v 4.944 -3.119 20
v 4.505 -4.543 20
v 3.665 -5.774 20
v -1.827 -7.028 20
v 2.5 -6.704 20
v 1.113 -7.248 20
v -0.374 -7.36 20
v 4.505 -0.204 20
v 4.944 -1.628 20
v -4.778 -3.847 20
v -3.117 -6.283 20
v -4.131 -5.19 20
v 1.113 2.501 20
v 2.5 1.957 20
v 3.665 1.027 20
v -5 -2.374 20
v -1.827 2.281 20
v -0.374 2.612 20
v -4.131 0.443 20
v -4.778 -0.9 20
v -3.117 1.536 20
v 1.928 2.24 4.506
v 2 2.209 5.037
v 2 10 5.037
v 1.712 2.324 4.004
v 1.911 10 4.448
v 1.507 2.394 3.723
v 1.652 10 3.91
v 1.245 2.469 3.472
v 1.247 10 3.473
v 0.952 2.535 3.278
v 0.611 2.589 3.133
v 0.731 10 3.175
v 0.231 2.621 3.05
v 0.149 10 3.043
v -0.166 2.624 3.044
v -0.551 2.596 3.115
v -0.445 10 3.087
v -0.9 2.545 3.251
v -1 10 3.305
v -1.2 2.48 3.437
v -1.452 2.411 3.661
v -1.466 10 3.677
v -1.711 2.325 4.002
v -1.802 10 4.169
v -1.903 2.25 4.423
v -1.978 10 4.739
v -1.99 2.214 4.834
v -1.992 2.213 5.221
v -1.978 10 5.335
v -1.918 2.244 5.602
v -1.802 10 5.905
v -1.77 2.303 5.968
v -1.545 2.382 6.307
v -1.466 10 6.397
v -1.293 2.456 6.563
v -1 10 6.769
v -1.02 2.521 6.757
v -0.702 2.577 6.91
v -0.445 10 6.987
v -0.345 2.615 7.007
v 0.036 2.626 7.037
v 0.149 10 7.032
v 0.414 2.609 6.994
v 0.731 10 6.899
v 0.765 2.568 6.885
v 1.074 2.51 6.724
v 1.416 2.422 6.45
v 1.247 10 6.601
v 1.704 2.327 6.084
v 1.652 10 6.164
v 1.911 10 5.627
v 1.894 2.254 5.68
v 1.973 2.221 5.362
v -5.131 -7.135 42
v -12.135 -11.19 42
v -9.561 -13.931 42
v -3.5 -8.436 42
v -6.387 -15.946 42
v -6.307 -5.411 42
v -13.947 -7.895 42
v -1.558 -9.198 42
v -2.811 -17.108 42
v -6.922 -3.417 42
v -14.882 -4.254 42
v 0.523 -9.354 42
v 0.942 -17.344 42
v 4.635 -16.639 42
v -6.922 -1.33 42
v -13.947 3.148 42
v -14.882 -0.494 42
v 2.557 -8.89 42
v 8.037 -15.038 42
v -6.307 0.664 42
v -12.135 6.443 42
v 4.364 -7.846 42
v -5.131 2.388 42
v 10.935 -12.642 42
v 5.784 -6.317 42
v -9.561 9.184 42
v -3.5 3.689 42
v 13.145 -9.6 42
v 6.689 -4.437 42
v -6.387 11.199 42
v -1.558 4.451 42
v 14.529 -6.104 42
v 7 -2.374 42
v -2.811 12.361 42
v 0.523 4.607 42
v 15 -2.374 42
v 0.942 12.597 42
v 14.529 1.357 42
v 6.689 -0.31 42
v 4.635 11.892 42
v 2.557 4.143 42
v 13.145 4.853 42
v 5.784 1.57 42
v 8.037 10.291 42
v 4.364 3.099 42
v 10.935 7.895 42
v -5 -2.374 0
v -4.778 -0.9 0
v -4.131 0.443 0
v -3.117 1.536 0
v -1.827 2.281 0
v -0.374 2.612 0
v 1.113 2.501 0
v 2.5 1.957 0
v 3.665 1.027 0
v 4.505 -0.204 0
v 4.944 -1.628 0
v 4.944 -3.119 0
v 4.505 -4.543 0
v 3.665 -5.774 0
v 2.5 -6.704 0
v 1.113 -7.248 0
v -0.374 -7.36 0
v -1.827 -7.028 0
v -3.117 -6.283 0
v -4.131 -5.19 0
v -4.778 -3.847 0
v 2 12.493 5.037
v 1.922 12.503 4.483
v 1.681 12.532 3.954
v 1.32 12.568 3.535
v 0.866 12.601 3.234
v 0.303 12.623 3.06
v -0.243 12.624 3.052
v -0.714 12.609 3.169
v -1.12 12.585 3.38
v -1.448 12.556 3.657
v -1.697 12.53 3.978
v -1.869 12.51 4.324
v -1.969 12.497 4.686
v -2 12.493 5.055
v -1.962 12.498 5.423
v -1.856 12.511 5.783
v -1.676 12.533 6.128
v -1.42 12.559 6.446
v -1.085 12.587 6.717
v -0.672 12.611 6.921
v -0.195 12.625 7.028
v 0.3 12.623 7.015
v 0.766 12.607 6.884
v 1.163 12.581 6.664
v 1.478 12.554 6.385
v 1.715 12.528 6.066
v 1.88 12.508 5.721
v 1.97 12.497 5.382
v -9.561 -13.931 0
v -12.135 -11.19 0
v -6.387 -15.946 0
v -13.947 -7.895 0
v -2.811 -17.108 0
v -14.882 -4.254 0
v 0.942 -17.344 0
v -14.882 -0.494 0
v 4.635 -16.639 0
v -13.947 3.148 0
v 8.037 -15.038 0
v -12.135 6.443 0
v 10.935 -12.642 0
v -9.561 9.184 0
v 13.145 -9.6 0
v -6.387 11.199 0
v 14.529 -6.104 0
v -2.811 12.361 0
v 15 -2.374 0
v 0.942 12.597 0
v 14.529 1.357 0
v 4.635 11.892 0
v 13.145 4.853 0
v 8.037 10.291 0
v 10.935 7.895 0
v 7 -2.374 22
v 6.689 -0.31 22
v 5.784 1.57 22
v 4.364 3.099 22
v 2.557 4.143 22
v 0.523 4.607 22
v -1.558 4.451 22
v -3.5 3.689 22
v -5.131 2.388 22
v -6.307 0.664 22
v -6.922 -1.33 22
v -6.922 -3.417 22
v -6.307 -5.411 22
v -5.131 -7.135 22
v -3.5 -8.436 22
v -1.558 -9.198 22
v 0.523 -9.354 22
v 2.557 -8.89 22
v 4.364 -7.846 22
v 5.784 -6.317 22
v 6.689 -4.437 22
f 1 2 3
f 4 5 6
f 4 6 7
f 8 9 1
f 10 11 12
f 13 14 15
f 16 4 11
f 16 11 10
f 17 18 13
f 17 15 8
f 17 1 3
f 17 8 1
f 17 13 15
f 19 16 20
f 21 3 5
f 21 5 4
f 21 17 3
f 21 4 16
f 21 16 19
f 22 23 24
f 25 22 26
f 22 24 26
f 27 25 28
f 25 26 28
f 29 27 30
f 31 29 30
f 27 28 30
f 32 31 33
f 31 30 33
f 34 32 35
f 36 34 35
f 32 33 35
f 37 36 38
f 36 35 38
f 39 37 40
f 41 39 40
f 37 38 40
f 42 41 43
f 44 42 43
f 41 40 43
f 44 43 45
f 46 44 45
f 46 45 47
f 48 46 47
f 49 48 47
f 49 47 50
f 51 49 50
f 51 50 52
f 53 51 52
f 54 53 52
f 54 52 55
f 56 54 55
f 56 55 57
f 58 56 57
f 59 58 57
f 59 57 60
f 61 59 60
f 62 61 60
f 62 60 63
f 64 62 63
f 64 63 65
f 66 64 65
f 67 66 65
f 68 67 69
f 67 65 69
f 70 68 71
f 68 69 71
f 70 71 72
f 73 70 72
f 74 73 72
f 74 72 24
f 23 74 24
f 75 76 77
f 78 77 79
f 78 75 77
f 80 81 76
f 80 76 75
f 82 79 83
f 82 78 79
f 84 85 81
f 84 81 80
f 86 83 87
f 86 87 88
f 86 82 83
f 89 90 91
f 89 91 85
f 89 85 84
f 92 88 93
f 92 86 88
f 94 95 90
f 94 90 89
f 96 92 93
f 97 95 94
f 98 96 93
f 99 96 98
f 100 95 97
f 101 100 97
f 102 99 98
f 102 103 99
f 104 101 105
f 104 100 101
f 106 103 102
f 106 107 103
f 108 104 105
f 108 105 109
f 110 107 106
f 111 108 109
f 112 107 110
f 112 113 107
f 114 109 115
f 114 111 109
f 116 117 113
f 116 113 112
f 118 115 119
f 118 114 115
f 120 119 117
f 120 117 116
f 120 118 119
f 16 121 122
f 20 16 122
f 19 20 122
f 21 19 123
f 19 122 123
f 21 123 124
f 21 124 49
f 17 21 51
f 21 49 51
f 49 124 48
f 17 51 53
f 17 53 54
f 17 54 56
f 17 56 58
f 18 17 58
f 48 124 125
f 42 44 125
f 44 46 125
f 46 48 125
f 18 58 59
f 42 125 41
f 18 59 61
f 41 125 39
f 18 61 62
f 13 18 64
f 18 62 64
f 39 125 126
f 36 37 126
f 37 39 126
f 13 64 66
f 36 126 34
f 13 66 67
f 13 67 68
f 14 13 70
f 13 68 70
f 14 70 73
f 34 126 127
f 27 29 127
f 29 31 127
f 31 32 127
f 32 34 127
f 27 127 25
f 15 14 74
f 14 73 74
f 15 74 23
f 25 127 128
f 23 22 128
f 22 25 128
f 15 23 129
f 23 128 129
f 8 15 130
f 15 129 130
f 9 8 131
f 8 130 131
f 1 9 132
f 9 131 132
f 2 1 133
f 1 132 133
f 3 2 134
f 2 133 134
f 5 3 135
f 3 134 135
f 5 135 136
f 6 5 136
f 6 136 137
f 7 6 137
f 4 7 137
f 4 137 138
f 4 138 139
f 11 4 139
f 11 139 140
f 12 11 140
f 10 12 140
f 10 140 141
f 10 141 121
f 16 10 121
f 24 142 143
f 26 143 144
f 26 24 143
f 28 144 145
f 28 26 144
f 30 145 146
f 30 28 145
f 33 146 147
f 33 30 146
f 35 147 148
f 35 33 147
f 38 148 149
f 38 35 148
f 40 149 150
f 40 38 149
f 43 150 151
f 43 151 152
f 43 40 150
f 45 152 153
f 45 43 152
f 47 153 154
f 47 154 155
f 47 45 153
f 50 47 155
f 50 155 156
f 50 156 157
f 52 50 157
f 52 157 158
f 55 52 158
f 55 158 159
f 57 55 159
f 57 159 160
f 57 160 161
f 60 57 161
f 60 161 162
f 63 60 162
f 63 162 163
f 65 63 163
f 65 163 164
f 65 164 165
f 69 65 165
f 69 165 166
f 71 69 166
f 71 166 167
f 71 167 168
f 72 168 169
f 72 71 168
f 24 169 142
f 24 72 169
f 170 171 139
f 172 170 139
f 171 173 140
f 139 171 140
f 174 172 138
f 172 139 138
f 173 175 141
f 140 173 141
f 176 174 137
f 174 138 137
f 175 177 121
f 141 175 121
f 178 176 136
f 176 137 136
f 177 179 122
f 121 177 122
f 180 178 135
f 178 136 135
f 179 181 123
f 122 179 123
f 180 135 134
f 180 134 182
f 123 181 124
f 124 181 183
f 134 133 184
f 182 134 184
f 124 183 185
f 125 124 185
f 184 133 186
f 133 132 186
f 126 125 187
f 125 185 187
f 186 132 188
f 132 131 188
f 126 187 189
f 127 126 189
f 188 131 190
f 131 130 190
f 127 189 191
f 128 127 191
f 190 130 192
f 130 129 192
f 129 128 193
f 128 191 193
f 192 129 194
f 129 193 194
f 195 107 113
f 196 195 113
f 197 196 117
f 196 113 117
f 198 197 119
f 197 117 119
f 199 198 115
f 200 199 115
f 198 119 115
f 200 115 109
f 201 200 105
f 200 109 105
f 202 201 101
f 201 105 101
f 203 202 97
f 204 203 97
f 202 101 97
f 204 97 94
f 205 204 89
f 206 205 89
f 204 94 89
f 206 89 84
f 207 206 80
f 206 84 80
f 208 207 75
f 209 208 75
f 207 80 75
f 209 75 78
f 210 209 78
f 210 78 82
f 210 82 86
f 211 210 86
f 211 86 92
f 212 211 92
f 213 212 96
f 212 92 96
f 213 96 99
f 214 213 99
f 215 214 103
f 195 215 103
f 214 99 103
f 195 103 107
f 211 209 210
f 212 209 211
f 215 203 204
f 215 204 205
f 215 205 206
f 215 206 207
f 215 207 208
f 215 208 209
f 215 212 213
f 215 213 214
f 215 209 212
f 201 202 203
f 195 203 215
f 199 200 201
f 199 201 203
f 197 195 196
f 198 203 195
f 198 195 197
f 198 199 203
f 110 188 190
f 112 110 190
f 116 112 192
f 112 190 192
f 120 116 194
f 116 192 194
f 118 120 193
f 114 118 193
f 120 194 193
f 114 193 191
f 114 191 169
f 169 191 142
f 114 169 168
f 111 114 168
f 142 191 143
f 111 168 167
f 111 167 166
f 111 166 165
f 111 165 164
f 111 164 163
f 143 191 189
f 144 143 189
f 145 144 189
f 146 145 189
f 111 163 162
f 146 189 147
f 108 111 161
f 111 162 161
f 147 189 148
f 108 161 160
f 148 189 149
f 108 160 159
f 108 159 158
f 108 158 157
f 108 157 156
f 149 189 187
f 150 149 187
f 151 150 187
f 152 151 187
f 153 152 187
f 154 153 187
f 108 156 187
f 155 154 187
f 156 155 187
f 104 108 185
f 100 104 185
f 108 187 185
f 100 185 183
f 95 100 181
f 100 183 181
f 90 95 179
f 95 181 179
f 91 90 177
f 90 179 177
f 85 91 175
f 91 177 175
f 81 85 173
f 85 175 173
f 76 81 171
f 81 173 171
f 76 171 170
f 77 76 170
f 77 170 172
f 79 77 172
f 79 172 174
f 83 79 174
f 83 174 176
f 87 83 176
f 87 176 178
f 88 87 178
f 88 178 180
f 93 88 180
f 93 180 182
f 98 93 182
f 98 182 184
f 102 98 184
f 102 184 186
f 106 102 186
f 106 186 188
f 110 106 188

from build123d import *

# Parameters (mm, degrees)
SKETCH_1_R               = 15
EXTRUDE_1_DEPTH          = 42
SKETCH_2_R               = 7
CUT_EXTRUDE_1_DEPTH      = 20
SKETCH_3_R               = 5
CUT_EXTRUDE_2_DEPTH      = 20
SKETCH_5_R               = 2
CUT_EXTRUDE_3_DEPTH      = 20
CUT_EXTRUDE_3_DEPTH_BACK = 10


with BuildPart() as part:
    # 草图1 → 凸台-拉伸1 (new body)
    with BuildSketch(Plane.XY):
        with Locations((0, -2.373543689)):
            Circle(SKETCH_1_R)
    extrude(amount=EXTRUDE_1_DEPTH)

    # 草图2 → 切除-拉伸1 (cut)
    with BuildSketch(Plane.XY.offset(42)):
        with Locations((0, -2.373543689)):
            Circle(SKETCH_2_R)
    extrude(amount=-CUT_EXTRUDE_1_DEPTH, mode=Mode.SUBTRACT)

    # 草图3 → 切除-拉伸2 (cut)
    with BuildSketch(Plane(origin=(0, 0, 0), x_dir=(-1, 0, 0), z_dir=(0, 0, -1))):
        with Locations((0, -2.373543689)):
            Circle(SKETCH_3_R)
    extrude(amount=-CUT_EXTRUDE_2_DEPTH, mode=Mode.SUBTRACT)

    # 草图5 → 切除-拉伸3 (cut, two sides)
    with BuildSketch(Plane(origin=(0, 10, 0), x_dir=(1, 0, 0), z_dir=(0, 1, 0))) as cut_extrude_3_sk:
        with Locations((0, -5.037121645)):
            Circle(SKETCH_5_R)
    extrude(amount=CUT_EXTRUDE_3_DEPTH, mode=Mode.SUBTRACT)
    extrude(cut_extrude_3_sk.sketch, amount=-CUT_EXTRUDE_3_DEPTH_BACK, mode=Mode.SUBTRACT)


solid = part.part
